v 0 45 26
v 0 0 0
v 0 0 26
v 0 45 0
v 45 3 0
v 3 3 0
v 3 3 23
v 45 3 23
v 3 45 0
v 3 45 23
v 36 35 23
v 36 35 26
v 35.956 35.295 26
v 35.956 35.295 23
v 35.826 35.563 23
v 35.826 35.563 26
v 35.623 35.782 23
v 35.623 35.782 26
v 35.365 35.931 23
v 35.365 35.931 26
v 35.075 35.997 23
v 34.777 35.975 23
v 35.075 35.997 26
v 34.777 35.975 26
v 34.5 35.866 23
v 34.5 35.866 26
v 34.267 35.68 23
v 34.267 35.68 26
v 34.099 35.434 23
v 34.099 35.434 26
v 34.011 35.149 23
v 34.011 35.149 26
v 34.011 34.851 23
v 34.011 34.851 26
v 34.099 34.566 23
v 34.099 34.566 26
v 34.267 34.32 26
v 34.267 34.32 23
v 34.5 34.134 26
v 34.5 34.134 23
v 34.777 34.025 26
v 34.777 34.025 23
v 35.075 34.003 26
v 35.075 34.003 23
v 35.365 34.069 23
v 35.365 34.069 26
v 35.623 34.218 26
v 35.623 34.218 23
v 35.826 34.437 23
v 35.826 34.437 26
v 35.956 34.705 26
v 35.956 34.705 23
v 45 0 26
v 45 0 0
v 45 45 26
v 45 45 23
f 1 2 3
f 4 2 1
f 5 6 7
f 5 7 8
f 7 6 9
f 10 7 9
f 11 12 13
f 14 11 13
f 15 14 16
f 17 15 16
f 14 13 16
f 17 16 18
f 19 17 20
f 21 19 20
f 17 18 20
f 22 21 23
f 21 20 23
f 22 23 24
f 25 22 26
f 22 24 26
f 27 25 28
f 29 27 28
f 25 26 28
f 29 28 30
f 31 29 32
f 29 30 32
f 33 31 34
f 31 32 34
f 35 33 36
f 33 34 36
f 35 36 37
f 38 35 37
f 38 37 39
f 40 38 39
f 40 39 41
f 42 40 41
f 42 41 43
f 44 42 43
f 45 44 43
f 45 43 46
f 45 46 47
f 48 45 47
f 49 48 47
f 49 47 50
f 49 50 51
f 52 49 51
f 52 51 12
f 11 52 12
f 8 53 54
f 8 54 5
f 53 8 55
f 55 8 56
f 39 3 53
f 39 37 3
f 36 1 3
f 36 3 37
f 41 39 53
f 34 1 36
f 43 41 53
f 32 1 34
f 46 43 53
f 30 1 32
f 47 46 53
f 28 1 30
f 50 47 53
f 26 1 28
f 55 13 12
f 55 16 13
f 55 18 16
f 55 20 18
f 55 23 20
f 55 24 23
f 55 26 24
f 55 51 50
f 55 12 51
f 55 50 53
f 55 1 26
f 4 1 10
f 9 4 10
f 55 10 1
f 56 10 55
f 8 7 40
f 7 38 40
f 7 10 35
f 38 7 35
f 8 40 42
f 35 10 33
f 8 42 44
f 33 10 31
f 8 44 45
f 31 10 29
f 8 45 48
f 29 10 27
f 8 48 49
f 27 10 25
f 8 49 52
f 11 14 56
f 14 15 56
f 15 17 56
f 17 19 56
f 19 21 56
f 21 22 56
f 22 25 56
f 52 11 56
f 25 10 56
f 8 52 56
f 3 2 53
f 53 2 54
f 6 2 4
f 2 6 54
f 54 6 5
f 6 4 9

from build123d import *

# Parameters (mm, degrees)
SKETCH001_W  = 42
SKETCH001_H  = 42
PAD001_DEPTH = 26
SKETCH_W     = 45
SKETCH_H     = 45
PAD_DEPTH    = 26
SKETCH002_R  = 1
POCKET_DEPTH = 26.001


with BuildPart() as batoque:
    # Sketch001 → Pad001 (new body)
    with BuildSketch(Plane.XY):
        with Locations((21, 21)):
            Rectangle(SKETCH001_W, SKETCH001_H)
    extrude(amount=PAD001_DEPTH)


with BuildPart() as batoque_1:
    # Body001 placement: moved
    add(batoque.part.moved(Location((3, 3, -3))))


with BuildPart() as gabarito:
    # Sketch → Pad (new body)
    with BuildSketch(Plane.XY):
        with Locations((22.5, 22.5)):
            Rectangle(SKETCH_W, SKETCH_H)
    extrude(amount=PAD_DEPTH)

    # Boolean: cut Batoque
    add(batoque_1.part, mode=Mode.SUBTRACT)

    # Sketch002 (on Face6 of Boolean) → Pocket (cut, through all)
    with BuildSketch(Plane.XY.offset(26)):
        with Locations((35, 35)):
            Circle(SKETCH002_R)
    extrude(amount=-POCKET_DEPTH, mode=Mode.SUBTRACT)


solid = gabarito.part
